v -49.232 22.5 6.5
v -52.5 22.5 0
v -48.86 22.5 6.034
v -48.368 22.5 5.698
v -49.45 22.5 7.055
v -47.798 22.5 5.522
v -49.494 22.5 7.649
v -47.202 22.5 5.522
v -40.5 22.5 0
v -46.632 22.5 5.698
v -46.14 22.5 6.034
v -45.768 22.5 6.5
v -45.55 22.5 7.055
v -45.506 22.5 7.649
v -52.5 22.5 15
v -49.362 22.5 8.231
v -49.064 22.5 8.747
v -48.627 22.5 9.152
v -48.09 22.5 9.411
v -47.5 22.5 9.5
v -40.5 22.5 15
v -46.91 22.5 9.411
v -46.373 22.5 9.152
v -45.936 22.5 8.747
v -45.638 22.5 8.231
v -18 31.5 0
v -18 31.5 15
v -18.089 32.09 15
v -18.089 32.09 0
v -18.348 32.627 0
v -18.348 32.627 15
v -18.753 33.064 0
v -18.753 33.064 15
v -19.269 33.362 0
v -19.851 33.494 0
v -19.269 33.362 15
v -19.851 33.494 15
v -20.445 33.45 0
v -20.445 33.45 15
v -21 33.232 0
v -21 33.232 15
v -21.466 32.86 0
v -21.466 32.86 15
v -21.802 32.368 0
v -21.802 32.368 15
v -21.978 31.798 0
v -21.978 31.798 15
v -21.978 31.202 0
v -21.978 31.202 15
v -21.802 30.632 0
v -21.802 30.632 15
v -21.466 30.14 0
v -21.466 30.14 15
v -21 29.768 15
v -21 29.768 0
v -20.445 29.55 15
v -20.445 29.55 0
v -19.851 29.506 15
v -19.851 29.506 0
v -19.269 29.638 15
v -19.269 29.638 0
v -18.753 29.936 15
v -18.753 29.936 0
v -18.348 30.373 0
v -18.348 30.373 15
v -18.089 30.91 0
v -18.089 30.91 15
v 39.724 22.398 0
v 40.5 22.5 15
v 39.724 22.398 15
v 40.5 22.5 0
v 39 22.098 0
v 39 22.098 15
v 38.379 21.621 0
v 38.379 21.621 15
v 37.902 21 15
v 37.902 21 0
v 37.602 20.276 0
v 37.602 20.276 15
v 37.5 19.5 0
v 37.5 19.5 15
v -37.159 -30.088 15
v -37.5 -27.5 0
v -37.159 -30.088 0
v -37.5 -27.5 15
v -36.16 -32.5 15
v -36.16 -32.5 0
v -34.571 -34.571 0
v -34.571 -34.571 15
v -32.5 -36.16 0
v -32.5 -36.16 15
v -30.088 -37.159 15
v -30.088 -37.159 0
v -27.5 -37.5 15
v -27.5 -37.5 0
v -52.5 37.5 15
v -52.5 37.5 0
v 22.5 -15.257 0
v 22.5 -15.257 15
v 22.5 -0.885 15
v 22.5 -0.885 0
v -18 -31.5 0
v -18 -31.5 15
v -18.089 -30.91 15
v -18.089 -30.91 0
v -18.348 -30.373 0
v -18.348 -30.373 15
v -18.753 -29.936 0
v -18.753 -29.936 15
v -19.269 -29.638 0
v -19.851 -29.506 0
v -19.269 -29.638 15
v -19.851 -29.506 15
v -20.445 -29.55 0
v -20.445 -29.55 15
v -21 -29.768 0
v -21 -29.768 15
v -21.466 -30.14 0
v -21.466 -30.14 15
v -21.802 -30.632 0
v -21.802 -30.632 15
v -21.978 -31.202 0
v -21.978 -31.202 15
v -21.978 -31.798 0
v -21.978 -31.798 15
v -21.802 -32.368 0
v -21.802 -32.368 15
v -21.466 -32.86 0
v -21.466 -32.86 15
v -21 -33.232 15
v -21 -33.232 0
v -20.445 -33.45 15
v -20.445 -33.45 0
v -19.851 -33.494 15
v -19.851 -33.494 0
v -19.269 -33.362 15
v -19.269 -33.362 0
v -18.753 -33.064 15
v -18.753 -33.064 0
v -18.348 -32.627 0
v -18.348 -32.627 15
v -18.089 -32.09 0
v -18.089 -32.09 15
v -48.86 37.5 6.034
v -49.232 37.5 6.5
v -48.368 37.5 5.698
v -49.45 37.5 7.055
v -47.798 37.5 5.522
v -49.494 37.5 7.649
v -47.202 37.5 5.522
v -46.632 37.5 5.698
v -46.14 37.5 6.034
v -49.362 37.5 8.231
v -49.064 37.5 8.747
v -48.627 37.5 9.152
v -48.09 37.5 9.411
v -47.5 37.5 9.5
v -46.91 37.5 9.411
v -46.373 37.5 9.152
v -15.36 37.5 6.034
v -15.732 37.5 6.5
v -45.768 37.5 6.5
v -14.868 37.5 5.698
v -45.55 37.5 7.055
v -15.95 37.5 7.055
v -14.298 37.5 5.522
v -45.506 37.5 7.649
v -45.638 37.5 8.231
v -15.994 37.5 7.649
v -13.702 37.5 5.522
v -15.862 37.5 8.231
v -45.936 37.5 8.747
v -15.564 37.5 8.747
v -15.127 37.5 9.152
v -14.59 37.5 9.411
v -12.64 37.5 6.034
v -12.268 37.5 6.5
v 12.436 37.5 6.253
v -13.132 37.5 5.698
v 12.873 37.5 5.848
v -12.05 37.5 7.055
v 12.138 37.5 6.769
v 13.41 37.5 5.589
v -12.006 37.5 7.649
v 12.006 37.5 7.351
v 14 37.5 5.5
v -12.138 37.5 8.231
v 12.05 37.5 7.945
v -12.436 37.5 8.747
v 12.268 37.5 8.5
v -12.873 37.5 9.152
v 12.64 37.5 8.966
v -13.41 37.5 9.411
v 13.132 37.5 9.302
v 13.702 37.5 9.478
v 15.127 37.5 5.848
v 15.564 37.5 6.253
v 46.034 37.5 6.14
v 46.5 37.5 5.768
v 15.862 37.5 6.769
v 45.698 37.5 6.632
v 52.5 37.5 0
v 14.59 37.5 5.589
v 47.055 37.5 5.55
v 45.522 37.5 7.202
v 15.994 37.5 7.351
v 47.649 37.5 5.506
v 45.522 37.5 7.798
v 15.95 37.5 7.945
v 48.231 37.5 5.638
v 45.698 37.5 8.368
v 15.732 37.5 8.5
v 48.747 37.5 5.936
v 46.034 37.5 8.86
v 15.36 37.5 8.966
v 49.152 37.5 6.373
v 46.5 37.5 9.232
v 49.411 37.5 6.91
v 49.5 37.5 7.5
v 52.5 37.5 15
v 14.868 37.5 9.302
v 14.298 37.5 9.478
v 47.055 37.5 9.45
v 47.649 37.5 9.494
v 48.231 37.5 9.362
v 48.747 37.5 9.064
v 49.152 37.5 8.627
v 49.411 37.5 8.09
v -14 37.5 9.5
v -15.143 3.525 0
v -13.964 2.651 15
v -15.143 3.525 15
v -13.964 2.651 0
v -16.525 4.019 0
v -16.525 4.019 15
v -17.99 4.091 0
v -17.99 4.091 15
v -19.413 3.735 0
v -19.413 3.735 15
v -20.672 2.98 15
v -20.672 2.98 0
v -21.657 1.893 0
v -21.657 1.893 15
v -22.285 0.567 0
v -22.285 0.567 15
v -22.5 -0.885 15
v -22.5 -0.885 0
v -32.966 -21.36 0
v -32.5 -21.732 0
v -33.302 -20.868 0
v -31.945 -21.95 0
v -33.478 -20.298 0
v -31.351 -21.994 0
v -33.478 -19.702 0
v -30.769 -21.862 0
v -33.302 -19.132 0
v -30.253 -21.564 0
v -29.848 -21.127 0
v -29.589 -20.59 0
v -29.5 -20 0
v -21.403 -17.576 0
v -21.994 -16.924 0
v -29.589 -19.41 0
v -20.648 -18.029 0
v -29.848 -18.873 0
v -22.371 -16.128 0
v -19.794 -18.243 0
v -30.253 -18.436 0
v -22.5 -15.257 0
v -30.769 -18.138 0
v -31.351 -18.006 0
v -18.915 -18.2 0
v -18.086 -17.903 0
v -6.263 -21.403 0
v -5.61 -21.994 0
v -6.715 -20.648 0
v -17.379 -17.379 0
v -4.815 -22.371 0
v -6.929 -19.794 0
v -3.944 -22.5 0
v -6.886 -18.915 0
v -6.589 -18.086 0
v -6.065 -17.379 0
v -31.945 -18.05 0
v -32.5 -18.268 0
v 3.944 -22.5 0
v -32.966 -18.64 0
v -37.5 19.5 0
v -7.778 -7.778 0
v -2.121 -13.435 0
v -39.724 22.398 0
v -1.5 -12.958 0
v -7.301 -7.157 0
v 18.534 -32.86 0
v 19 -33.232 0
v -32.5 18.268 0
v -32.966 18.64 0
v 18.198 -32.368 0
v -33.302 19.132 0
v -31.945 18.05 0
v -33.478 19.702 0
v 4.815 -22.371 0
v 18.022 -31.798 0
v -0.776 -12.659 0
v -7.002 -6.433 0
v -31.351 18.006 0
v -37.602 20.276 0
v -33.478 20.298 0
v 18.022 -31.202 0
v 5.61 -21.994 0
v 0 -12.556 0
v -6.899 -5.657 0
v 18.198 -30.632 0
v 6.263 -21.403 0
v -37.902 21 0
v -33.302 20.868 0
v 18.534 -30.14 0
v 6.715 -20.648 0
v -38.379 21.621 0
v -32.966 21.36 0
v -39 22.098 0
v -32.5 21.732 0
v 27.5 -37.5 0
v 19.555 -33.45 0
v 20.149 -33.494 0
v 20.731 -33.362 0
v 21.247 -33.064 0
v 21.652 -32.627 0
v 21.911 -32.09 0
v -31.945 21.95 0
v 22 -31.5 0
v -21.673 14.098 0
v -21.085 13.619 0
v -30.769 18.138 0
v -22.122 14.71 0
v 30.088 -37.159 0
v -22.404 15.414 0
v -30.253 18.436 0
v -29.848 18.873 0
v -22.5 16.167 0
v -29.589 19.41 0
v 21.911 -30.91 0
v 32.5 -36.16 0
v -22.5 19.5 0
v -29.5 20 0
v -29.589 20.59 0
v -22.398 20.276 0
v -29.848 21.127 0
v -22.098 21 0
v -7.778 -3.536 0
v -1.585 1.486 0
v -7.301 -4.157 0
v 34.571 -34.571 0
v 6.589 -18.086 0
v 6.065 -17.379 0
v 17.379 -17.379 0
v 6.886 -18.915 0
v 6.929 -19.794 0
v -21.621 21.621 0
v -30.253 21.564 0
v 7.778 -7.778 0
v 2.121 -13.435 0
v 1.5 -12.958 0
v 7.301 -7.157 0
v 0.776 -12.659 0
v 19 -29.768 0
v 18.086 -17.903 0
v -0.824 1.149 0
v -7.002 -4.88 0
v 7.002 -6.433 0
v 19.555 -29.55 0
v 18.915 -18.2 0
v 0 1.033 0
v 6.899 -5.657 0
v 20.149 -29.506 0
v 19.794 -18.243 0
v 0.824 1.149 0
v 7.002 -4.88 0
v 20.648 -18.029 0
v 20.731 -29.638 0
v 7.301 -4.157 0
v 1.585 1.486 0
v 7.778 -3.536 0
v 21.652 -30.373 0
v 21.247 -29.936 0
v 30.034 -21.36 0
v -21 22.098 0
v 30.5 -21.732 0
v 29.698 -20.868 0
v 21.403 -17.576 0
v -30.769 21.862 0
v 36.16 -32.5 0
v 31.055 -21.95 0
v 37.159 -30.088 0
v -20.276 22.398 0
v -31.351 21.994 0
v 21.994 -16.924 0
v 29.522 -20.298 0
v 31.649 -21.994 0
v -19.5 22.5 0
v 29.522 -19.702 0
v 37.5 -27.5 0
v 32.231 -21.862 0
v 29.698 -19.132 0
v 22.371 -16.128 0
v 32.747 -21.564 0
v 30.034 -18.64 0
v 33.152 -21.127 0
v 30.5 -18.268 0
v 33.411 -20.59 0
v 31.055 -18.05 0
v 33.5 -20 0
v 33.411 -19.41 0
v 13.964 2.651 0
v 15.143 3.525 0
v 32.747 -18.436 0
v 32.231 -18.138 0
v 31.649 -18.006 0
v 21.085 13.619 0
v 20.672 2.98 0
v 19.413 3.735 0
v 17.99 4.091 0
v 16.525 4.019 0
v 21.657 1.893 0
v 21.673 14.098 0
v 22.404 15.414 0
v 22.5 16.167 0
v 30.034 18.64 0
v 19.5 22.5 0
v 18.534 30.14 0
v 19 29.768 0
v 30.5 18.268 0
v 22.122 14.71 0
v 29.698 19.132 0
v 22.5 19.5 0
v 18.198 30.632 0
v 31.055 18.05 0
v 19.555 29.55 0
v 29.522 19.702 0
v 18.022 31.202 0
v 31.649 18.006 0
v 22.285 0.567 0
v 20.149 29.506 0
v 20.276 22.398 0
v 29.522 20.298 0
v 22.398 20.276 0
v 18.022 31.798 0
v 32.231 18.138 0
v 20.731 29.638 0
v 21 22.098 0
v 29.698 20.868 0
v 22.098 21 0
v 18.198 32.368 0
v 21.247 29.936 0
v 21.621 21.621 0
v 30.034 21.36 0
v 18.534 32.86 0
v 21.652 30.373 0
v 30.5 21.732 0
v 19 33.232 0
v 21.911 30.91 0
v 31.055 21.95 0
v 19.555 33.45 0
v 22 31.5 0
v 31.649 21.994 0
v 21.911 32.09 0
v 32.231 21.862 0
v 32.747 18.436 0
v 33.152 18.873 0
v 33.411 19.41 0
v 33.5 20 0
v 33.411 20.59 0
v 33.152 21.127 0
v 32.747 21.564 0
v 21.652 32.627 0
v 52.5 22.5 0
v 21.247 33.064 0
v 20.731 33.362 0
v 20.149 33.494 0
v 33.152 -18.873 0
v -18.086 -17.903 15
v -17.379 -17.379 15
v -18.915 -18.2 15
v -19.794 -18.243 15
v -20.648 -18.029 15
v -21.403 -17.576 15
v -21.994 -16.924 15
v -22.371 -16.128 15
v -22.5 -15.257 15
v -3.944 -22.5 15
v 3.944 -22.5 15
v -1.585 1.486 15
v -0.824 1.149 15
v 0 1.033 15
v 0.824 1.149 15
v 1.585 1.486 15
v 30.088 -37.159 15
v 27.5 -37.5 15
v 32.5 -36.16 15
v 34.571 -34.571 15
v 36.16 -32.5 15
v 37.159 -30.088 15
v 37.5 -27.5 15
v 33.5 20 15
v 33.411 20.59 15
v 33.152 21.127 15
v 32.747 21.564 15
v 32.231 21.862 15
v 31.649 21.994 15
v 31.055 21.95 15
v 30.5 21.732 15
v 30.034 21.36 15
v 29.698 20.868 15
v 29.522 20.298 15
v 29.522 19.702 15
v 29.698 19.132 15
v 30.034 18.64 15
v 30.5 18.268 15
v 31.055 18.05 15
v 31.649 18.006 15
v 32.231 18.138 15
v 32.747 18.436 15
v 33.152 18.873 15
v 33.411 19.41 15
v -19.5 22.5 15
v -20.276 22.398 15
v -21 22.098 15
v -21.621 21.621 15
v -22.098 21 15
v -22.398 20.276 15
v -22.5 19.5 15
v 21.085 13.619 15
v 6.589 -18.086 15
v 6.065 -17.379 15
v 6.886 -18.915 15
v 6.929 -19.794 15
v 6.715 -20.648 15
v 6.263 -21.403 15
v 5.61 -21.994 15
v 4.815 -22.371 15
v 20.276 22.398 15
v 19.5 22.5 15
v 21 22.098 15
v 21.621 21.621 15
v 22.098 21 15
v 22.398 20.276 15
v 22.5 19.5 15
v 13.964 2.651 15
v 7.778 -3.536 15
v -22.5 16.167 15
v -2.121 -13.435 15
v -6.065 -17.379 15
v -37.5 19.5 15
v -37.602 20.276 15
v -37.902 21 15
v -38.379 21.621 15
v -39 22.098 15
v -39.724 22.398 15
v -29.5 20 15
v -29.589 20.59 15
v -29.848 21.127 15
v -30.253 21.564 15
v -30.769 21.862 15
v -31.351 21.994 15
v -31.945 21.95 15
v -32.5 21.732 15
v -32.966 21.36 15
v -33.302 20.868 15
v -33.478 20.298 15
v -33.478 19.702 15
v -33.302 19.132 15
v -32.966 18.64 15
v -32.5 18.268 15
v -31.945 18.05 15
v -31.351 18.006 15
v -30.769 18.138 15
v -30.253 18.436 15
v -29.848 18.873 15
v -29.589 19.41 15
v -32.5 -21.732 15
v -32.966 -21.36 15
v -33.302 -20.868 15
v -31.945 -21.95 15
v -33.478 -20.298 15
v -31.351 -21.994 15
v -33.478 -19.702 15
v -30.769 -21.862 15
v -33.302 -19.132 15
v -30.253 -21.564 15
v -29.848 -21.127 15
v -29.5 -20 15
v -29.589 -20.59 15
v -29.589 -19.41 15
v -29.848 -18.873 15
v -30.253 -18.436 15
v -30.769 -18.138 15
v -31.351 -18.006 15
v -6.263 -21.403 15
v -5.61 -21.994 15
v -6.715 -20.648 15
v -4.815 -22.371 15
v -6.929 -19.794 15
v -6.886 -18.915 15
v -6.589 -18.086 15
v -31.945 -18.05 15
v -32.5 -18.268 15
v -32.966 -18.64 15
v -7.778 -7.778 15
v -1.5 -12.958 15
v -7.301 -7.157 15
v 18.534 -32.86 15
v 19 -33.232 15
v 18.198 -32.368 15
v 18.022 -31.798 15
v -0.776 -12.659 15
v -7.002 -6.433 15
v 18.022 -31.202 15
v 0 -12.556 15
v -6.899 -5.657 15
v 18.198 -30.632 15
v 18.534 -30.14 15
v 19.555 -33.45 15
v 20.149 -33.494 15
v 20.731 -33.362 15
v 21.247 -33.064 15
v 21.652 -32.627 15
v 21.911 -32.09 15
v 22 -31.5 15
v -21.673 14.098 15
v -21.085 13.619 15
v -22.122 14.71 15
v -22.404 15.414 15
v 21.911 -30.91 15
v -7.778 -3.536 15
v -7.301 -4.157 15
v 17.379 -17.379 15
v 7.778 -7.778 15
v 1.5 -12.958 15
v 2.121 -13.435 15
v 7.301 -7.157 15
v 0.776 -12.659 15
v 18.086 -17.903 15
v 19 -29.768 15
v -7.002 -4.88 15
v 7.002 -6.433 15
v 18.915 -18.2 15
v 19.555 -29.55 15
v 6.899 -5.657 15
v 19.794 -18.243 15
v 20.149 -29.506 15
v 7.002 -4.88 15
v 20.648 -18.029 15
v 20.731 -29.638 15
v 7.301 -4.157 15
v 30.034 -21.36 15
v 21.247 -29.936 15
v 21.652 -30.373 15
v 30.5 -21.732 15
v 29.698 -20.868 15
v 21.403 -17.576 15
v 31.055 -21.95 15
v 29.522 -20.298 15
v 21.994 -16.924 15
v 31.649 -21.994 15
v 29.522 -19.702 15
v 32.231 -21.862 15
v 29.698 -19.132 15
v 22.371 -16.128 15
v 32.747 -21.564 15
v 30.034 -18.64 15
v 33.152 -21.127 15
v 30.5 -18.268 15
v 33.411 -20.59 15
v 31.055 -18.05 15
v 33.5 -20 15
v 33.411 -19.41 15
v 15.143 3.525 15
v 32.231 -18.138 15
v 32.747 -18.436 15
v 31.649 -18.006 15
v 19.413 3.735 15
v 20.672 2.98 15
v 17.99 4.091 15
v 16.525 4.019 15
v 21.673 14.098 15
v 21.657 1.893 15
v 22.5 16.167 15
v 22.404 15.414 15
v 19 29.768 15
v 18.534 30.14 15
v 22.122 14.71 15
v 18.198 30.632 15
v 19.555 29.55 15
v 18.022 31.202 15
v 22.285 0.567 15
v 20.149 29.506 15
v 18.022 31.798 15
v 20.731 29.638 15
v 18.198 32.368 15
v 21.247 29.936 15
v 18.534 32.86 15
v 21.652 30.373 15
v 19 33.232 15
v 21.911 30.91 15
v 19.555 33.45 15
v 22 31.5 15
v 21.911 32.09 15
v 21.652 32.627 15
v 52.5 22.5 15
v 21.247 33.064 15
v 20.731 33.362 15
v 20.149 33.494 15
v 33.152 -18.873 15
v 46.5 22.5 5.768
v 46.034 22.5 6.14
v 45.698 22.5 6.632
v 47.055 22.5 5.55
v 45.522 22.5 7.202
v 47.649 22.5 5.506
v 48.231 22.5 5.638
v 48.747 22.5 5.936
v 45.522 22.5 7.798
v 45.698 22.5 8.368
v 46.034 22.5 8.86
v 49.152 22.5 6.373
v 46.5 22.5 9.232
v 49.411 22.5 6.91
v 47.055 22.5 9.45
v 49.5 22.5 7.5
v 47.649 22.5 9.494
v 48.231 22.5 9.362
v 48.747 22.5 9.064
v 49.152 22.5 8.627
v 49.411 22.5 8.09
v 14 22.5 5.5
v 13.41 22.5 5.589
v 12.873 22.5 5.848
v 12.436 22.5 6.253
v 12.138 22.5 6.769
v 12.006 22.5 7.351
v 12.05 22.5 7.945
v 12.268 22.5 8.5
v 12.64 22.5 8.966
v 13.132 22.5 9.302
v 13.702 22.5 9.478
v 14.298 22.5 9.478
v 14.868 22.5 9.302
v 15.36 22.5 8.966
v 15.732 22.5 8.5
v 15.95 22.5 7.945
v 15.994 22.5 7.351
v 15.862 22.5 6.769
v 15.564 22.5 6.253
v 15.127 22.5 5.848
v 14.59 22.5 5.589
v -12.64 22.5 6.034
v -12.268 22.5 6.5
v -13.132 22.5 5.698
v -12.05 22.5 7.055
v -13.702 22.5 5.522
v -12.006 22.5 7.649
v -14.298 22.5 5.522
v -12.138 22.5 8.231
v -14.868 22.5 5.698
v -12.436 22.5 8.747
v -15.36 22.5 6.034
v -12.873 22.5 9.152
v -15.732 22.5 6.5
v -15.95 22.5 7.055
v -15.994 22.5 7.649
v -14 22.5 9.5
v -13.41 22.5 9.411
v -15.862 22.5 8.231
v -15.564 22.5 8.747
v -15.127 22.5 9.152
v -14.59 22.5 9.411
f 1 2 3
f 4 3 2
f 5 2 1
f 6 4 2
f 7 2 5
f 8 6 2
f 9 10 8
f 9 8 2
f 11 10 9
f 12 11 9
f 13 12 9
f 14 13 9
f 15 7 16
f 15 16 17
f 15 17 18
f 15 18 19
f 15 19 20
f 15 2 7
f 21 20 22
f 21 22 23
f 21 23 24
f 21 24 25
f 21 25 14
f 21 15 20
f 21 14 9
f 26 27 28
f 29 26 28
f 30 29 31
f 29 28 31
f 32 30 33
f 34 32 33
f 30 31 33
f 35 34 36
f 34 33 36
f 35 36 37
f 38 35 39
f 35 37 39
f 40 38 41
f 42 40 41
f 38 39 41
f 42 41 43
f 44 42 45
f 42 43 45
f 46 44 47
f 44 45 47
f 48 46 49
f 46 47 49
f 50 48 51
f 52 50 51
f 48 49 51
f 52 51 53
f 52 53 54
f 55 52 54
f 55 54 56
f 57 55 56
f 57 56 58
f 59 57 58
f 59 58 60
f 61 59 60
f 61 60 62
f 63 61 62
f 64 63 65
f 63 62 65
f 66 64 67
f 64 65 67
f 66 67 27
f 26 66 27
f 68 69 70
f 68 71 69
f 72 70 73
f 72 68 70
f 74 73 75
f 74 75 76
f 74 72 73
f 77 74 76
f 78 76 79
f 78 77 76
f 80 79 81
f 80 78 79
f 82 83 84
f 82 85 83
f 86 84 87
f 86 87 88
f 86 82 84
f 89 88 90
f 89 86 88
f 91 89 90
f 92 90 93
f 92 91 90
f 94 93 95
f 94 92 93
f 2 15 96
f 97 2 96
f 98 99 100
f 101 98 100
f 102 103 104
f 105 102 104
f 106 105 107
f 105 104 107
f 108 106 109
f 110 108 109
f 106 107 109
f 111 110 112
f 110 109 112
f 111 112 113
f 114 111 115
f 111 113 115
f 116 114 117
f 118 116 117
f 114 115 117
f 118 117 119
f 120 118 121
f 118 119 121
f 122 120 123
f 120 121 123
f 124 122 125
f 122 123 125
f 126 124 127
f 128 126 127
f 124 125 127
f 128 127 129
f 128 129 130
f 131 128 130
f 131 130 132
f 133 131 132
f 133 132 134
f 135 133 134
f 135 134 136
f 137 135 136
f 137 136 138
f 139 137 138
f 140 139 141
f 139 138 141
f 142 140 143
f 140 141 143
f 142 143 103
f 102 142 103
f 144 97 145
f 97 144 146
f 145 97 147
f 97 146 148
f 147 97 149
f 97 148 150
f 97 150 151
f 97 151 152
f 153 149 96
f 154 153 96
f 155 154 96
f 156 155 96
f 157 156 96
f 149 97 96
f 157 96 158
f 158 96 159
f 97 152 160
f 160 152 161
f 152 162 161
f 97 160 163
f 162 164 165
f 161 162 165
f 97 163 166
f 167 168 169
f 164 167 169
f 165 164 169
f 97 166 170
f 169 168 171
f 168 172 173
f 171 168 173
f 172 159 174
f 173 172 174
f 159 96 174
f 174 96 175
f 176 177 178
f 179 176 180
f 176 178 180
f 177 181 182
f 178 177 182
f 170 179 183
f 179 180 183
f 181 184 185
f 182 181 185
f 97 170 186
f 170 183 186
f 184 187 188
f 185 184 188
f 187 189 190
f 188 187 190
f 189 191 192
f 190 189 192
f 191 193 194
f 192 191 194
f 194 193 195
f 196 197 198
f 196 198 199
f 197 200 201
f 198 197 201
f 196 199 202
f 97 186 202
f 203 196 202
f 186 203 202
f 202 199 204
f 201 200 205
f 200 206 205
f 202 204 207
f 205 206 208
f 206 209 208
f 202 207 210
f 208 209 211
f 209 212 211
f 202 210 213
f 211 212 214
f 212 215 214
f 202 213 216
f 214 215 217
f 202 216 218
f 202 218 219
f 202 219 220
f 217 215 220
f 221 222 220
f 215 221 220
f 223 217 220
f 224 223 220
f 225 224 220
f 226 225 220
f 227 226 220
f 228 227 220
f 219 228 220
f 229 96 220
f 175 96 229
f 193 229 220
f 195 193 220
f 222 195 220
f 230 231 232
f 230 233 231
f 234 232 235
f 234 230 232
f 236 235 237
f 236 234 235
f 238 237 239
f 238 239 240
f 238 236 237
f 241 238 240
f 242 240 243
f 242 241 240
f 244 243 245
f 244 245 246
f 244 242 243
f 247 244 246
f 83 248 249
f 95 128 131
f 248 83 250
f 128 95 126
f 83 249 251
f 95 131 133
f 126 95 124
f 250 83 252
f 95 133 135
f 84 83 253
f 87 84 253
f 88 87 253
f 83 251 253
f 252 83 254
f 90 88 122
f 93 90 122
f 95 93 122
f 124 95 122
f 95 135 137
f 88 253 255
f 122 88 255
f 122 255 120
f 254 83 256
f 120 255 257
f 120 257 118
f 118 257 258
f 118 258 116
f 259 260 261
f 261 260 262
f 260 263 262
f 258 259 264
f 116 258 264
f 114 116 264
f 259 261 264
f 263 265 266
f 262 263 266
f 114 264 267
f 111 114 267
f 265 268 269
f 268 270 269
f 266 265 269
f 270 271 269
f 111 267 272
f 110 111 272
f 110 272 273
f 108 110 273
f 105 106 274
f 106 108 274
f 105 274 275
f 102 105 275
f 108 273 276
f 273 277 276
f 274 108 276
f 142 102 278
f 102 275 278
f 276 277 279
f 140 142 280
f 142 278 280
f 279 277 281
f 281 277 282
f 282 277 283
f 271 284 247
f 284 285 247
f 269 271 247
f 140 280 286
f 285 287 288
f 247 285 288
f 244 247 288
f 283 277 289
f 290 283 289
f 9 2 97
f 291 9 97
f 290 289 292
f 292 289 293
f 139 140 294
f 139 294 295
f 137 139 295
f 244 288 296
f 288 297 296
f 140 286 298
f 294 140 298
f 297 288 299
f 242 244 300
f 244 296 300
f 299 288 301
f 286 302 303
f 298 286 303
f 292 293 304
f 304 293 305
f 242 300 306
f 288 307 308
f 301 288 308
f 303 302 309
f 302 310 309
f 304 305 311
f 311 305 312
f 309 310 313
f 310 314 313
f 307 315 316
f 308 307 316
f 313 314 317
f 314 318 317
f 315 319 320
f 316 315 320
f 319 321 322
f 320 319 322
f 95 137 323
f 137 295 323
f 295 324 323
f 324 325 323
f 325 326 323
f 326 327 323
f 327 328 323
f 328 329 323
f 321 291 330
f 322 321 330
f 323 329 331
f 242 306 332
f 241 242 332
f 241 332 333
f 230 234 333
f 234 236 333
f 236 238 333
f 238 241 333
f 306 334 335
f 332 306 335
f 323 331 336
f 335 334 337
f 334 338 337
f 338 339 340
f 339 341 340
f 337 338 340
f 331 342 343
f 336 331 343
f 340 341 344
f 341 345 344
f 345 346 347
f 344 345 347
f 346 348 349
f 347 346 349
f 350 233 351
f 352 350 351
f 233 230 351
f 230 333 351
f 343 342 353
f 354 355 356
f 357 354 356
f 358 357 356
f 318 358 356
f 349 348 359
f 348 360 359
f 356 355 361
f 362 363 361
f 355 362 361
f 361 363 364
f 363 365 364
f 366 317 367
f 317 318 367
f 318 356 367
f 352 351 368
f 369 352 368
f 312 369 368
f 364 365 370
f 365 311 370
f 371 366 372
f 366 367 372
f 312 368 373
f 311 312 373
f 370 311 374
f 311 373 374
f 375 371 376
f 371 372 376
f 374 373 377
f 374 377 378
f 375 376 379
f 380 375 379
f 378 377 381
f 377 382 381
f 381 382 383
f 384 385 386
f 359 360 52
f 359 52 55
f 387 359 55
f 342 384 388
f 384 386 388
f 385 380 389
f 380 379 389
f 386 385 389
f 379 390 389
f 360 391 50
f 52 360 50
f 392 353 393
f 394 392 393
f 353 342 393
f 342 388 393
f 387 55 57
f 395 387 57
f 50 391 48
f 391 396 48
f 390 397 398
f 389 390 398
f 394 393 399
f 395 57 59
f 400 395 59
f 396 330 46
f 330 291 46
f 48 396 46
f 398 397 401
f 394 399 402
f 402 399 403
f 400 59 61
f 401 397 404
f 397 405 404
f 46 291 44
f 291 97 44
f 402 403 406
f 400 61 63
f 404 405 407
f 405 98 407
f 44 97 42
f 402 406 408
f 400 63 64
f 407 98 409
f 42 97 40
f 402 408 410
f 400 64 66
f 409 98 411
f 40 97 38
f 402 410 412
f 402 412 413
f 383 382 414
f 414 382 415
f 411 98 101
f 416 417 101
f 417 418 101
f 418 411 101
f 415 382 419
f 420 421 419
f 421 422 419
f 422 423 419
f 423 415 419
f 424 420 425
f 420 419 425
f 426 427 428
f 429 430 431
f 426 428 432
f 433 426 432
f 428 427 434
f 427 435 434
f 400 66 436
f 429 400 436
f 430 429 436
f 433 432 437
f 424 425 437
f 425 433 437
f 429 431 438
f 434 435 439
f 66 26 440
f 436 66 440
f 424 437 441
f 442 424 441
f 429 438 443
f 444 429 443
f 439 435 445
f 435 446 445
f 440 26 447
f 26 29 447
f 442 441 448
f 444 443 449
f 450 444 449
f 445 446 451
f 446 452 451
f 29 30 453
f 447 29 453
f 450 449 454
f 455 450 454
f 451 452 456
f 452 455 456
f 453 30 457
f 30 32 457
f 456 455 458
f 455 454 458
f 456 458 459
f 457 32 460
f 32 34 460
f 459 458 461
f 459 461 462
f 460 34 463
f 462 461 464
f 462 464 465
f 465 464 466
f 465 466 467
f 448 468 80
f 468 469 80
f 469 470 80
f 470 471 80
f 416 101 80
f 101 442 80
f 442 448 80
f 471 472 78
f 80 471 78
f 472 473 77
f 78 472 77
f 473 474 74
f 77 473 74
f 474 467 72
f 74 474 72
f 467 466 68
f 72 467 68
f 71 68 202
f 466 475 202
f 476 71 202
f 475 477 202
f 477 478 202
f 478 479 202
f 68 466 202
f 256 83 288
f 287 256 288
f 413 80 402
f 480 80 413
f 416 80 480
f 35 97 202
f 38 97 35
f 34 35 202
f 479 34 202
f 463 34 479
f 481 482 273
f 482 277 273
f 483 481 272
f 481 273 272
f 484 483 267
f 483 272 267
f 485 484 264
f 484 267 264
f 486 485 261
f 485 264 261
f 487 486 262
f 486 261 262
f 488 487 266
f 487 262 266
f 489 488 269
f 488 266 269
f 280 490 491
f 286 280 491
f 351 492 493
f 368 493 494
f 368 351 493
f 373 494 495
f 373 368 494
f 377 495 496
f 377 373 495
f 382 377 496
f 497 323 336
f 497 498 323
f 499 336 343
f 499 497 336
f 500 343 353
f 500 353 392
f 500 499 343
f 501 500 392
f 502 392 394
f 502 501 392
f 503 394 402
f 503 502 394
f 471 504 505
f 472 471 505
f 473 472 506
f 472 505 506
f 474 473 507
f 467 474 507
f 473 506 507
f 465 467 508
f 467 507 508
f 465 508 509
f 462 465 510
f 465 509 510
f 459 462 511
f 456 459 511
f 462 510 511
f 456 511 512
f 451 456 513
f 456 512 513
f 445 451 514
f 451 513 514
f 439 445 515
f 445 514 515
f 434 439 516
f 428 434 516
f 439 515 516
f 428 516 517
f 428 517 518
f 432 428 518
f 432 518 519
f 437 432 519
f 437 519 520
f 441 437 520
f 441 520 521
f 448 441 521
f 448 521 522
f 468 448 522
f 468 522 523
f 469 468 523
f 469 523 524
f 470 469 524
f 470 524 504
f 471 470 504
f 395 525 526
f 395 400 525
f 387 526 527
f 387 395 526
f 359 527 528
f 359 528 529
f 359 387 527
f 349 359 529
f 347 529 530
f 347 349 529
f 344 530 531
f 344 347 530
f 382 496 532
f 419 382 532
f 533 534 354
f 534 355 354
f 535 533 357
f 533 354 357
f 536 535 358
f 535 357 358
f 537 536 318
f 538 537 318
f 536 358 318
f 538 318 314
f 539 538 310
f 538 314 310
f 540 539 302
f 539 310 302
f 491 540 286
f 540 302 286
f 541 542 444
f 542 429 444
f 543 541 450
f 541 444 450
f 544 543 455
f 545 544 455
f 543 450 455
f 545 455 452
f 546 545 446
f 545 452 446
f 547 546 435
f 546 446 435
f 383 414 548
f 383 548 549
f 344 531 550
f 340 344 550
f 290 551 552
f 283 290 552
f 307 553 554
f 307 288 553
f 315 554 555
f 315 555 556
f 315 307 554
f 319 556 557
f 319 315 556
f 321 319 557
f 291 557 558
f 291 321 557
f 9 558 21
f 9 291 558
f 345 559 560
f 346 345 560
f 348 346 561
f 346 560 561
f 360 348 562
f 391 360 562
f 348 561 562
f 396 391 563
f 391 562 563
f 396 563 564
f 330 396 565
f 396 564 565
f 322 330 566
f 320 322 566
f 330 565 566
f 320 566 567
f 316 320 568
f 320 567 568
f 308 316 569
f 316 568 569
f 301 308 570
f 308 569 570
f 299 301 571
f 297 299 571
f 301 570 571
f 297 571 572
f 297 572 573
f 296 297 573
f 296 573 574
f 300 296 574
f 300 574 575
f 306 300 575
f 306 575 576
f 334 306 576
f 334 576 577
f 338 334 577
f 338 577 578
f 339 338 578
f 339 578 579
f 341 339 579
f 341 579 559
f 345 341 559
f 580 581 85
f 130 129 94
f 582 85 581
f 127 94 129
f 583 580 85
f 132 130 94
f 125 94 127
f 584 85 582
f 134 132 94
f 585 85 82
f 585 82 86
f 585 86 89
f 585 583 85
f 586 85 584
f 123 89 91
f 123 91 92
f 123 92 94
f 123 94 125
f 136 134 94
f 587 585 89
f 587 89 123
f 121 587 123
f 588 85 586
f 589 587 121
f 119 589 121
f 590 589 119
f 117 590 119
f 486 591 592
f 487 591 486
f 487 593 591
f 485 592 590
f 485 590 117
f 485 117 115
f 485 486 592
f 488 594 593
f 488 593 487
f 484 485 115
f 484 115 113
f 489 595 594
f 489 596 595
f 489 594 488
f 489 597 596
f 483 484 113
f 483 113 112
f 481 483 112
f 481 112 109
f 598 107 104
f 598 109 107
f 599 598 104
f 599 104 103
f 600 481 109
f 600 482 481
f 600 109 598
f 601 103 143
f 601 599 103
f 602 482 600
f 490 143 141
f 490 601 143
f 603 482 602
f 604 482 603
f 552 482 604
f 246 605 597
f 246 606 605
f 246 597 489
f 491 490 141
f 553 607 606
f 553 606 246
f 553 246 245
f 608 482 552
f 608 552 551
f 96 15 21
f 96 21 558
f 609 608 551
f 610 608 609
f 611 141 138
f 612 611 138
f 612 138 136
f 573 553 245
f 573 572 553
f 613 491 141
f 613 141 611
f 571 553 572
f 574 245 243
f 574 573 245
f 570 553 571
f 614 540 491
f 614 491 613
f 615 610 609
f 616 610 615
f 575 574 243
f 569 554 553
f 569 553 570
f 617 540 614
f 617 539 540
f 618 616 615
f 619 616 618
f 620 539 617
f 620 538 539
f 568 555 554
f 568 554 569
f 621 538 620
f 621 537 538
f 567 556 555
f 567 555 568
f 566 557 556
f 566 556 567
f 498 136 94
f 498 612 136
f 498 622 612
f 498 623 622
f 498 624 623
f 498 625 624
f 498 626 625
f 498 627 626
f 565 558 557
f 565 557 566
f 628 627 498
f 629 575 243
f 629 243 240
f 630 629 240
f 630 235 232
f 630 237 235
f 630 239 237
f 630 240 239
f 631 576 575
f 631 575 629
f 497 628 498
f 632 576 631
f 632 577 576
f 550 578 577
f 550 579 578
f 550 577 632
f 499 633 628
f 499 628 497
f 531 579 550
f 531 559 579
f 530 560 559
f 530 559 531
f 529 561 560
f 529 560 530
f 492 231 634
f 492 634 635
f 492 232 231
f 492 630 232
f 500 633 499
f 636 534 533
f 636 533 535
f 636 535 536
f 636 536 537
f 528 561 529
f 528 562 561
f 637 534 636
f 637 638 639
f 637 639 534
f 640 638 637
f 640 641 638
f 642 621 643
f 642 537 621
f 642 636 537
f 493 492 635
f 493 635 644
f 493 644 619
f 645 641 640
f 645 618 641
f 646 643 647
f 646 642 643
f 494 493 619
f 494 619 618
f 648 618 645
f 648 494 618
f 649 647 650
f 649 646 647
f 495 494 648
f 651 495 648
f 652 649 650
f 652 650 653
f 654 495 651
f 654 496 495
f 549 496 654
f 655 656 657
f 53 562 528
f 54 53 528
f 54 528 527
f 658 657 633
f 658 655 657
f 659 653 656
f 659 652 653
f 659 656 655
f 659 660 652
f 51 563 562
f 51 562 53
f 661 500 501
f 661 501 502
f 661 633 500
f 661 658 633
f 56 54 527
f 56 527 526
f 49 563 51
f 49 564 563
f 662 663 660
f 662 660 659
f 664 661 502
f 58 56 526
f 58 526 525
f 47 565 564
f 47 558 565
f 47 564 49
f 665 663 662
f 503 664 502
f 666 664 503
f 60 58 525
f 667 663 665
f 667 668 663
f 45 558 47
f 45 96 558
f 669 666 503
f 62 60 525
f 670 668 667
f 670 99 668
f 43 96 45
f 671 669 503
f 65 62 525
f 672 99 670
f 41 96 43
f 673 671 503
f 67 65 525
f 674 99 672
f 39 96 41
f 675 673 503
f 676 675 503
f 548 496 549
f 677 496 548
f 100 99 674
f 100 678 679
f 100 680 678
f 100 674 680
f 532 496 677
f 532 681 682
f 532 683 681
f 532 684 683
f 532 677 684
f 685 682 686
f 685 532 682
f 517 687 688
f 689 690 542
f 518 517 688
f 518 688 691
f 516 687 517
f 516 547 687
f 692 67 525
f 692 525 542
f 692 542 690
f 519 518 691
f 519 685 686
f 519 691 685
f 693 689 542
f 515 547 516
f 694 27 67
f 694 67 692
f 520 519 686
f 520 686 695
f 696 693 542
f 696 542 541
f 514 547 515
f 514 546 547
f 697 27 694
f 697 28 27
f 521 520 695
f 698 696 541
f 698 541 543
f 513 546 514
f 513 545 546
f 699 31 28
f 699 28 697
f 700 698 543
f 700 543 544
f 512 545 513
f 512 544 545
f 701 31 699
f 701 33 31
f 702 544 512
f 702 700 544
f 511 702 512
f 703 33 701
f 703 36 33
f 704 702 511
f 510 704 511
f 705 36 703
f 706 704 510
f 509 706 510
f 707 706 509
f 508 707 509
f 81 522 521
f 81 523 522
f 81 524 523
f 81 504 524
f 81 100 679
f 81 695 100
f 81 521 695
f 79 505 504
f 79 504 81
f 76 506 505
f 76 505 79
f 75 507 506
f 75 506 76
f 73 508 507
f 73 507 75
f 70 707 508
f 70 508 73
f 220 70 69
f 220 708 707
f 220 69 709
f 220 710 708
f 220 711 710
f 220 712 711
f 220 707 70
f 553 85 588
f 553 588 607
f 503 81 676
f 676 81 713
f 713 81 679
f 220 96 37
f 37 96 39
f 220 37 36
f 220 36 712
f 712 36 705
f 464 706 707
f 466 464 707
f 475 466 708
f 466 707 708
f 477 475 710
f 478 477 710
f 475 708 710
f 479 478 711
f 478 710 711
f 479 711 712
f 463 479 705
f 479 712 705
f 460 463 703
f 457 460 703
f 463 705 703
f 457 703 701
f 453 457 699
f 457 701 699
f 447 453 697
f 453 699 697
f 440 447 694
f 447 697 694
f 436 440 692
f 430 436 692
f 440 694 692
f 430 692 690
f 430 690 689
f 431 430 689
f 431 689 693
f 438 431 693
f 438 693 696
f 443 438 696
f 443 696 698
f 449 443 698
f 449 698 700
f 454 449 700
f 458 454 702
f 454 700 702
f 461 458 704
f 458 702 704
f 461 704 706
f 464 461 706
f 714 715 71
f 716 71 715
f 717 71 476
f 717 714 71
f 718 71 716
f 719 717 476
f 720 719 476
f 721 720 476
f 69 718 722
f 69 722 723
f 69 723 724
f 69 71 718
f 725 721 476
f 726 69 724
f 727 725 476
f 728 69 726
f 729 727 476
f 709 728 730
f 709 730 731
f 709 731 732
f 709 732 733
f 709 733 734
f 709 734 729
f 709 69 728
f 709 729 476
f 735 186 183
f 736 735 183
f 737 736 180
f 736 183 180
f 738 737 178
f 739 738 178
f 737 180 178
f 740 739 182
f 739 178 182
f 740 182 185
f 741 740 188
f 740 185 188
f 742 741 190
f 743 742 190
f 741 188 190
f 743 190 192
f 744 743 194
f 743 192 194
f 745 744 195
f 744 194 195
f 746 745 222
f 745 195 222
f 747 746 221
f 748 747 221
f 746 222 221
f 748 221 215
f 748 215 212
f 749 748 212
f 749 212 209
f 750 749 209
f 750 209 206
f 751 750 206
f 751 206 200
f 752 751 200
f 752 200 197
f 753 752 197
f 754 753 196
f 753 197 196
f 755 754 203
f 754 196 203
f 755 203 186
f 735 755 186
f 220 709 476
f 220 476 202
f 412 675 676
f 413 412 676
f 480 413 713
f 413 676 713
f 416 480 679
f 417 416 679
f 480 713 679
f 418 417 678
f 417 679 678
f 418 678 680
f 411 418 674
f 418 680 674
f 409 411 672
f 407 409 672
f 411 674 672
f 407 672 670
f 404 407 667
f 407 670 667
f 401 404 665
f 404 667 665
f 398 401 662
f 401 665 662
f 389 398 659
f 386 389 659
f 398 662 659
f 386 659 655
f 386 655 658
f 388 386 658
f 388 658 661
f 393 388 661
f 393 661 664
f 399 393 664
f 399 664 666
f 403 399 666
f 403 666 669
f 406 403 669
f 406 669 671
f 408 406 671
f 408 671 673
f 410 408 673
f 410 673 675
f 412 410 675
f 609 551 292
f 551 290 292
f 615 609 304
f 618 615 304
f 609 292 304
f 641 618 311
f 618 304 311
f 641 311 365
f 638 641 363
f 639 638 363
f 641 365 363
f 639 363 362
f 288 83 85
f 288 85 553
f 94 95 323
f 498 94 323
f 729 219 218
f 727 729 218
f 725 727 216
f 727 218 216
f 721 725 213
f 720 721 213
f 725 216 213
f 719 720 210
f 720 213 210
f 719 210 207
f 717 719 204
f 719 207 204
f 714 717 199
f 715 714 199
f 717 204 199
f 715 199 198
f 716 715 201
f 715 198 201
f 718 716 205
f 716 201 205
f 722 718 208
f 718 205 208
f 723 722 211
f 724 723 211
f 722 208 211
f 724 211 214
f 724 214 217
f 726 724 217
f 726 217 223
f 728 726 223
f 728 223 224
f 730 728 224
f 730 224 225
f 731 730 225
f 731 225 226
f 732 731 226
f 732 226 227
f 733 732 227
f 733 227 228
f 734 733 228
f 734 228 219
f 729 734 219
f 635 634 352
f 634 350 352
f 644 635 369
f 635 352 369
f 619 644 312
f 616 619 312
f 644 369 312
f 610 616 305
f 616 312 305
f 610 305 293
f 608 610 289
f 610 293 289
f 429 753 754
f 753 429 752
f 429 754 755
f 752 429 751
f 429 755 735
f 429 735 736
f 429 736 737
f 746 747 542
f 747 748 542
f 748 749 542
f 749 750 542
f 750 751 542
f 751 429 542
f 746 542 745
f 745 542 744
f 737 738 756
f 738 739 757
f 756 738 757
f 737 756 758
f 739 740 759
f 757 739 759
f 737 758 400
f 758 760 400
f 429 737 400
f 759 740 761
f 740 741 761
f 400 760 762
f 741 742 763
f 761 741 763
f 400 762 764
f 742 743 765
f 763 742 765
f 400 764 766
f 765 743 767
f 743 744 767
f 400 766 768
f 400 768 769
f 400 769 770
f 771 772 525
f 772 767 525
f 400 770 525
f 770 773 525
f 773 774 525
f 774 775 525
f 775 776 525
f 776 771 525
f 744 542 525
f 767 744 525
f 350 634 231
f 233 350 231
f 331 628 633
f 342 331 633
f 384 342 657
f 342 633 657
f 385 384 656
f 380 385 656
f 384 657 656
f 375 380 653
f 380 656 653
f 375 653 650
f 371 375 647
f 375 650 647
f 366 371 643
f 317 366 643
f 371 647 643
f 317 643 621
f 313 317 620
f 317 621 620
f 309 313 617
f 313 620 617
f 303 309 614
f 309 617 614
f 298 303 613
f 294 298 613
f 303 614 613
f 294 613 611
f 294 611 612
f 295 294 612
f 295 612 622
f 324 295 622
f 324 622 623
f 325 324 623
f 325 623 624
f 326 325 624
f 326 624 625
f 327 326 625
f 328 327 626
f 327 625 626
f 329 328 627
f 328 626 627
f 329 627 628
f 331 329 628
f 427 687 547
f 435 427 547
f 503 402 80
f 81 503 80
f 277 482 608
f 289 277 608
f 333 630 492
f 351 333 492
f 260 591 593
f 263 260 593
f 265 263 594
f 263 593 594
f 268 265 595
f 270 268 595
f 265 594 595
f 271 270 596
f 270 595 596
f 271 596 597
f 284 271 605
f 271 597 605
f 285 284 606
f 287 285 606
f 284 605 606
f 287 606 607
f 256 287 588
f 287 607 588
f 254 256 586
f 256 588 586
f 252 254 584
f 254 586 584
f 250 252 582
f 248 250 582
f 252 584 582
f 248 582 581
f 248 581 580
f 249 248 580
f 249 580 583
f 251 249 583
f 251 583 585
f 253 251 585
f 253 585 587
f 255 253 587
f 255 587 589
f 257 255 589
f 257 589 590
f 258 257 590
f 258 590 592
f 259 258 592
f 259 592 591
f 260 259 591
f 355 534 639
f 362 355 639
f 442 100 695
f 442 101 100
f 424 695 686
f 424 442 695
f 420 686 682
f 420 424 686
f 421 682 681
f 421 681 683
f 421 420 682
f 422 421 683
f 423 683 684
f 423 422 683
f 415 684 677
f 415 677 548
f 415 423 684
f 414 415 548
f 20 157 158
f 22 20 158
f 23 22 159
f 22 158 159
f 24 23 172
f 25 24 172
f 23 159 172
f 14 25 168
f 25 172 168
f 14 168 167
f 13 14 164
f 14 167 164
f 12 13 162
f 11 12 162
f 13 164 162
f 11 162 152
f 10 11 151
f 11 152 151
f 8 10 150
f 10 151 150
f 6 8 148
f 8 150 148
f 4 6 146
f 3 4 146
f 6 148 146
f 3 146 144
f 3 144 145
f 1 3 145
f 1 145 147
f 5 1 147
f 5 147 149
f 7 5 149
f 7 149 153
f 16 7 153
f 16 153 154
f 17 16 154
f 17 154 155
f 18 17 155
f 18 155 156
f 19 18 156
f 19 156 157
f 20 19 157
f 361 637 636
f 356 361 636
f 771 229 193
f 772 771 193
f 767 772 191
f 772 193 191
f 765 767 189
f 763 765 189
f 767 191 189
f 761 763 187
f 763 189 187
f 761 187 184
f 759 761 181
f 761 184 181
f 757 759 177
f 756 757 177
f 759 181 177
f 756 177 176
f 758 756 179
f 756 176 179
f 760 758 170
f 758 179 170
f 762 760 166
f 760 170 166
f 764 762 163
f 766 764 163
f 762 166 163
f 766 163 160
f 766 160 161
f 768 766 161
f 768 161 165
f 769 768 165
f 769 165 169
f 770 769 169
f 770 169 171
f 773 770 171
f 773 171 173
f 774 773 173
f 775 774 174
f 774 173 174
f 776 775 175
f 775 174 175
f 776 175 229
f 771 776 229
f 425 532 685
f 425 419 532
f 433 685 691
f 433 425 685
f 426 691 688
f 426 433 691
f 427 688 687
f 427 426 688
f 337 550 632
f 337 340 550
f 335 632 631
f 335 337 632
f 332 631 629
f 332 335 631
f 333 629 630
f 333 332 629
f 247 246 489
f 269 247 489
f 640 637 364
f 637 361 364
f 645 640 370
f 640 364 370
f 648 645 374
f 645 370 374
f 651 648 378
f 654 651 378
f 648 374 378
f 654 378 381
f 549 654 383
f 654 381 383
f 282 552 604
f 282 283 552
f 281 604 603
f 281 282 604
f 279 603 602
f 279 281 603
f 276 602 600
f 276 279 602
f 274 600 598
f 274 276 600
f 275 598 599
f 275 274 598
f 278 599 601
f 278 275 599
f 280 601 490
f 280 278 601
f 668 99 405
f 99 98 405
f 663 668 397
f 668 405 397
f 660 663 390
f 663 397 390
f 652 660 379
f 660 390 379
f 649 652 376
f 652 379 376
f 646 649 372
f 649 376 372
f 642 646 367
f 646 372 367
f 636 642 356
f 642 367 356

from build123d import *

# Parameters (mm, degrees)
SKETCH_1_W          = 75
SKETCH_1_H          = 75
EXTRUDE_1_DEPTH     = 15
SKETCH_2_R          = 2
CUT_EXTRUDE_1_DEPTH = 15
SKETCH_3_R          = 2
CUT_EXTRUDE_2_DEPTH = 56.113519213
FILLET_1_R          = 10
CUT_EXTRUDE_4_DEPTH = 15
CUT_EXTRUDE_5_DEPTH = 56.113519213
FILLET_3_R          = 5
FILLET_4_R          = 3
SKETCH_6_R          = 2
CUT_EXTRUDE_6_DEPTH = 15
SKETCH_8_W          = 15
SKETCH_8_H          = 15
EXTRUDE_2_DEPTH     = 15
FILLET_5_R          = 3
SKETCH_9_R          = 2
CUT_EXTRUDE_8_DEPTH = 93.769876576


with BuildPart() as part:
    # 草图1 → 凸台-拉伸1 (new body)
    with BuildSketch(Plane.XY):
        Rectangle(SKETCH_1_W, SKETCH_1_H)
    extrude(amount=EXTRUDE_1_DEPTH)

    # 草图2 → 切除-拉伸1 (cut)
    with BuildSketch(Plane.XY.offset(15)):
        with Locations((-20, 31.5)):
            Circle(SKETCH_2_R)
        with Locations((20, 31.5)):
            Circle(SKETCH_2_R)
        with Locations((20, -31.5)):
            Circle(SKETCH_2_R)
        with Locations((-20, -31.5)):
            Circle(SKETCH_2_R)
    extrude(amount=-CUT_EXTRUDE_1_DEPTH, mode=Mode.SUBTRACT)

    # 草图3 → 切除-拉伸2 (cut, through all)
    with BuildSketch(Plane.XY.offset(15)):
        with Locations((-31.5, 20)):
            Circle(SKETCH_3_R)
        with Locations((-31.5, -20)):
            Circle(SKETCH_3_R)
        with Locations((31.5, -20)):
            Circle(SKETCH_3_R)
        with Locations((31.5, 20)):
            Circle(SKETCH_3_R)
    extrude(amount=-CUT_EXTRUDE_2_DEPTH, mode=Mode.SUBTRACT)

    # 圆角1
    fillet_1_edges = [part.edges().sort_by_distance(p)[0] for p in [
        (37.5, -37.5, 7.5),
        (-37.5, -37.5, 7.5),
    ]]
    fillet(fillet_1_edges, radius=FILLET_1_R)

    # 草图4 → 切除-拉伸4 (cut)
    with BuildSketch(Plane.XY.offset(15)):
        Polygon((-5.656854249, -5.656854249), (-22.5, 11.186291501), (-22.5, -22.5), align=None)
        Polygon((0, -11.313708499), (-11.186291501, -22.5), (11.186291501, -22.5), align=None)
        Polygon((22.5, -22.5), (22.5, 11.186291501), (5.656854249, -5.656854249), align=None)
    extrude(amount=-CUT_EXTRUDE_4_DEPTH, mode=Mode.SUBTRACT)

    # 草图5 → 切除-拉伸5 (cut, through all)
    with BuildSketch(Plane.XY.offset(15)):
        Polygon((22.5, 22.5), (-22.5, 22.5), (-22.5, 14.5), (0, 0.5), (22.5, 14.5), align=None)
    extrude(amount=-CUT_EXTRUDE_5_DEPTH, mode=Mode.SUBTRACT)

    # 圆角3
    fillet_3_edges = [part.edges().sort_by_distance(p)[0] for p in [
        (22.5, 11.186291501, 7.5),
        (-22.5, 11.186291501, 7.5),
    ]]
    fillet(fillet_3_edges, radius=FILLET_3_R)

    # 圆角4
    fillet_4_edges = [part.edges().sort_by_distance(p)[0] for p in [
        (22.5, 14.5, 7.5),
        (0, 0.5, 7.5),
        (-22.5, 14.5, 7.5),
        (-22.5, 22.5, 7.5),
        (22.5, 22.5, 7.5),
        (-11.186291501, -22.5, 7.5),
        (0, -11.313708499, 7.5),
        (11.186291501, -22.5, 7.5),
        (5.656854249, -5.656854249, 7.5),
        (22.5, -22.5, 7.5),
        (-5.656854249, -5.656854249, 7.5),
        (-22.5, -22.5, 7.5),
    ]]
    fillet(fillet_4_edges, radius=FILLET_4_R)

    # 草图6 → 切除-拉伸6 (cut)
    with BuildSketch(Plane(origin=(0, 37.5, 0), x_dir=(1, 0, 0), z_dir=(0, 1, 0))):
        with Locations(Location((-14, -7.5, 0), (0, 0, 270))):
            Circle(SKETCH_6_R)
        with Locations(Location((14, -7.5, 0), (0, 0, 90))):
            Circle(SKETCH_6_R)
    extrude(amount=-CUT_EXTRUDE_6_DEPTH, mode=Mode.SUBTRACT)

    # 草图8 → 凸台-拉伸2 (add)
    with BuildSketch(Plane.XY.offset(15)):
        with Locations((-45, 30)):
            Rectangle(SKETCH_8_W, SKETCH_8_H)
        with Locations((45, 30)):
            Rectangle(SKETCH_8_W, SKETCH_8_H)
    extrude(amount=-EXTRUDE_2_DEPTH)

    # 圆角5
    fillet_5_edges = [part.edges().sort_by_distance(p)[0] for p in [
        (-37.5, 22.5, 7.5),
        (37.5, 22.5, 7.5),
    ]]
    fillet(fillet_5_edges, radius=FILLET_5_R)

    # 草图9 → 切除-拉伸8 (cut, through all)
    with BuildSketch(Plane(origin=(0, 37.5, 0), x_dir=(1, 0, 0), z_dir=(0, 1, 0))):
        with Locations(Location((-47.5, -7.5, 0), (0, 0, 270))):
            Circle(SKETCH_9_R)
        with Locations((47.5, -7.5)):
            Circle(SKETCH_9_R)
    extrude(amount=-CUT_EXTRUDE_8_DEPTH, mode=Mode.SUBTRACT)


solid = part.part
